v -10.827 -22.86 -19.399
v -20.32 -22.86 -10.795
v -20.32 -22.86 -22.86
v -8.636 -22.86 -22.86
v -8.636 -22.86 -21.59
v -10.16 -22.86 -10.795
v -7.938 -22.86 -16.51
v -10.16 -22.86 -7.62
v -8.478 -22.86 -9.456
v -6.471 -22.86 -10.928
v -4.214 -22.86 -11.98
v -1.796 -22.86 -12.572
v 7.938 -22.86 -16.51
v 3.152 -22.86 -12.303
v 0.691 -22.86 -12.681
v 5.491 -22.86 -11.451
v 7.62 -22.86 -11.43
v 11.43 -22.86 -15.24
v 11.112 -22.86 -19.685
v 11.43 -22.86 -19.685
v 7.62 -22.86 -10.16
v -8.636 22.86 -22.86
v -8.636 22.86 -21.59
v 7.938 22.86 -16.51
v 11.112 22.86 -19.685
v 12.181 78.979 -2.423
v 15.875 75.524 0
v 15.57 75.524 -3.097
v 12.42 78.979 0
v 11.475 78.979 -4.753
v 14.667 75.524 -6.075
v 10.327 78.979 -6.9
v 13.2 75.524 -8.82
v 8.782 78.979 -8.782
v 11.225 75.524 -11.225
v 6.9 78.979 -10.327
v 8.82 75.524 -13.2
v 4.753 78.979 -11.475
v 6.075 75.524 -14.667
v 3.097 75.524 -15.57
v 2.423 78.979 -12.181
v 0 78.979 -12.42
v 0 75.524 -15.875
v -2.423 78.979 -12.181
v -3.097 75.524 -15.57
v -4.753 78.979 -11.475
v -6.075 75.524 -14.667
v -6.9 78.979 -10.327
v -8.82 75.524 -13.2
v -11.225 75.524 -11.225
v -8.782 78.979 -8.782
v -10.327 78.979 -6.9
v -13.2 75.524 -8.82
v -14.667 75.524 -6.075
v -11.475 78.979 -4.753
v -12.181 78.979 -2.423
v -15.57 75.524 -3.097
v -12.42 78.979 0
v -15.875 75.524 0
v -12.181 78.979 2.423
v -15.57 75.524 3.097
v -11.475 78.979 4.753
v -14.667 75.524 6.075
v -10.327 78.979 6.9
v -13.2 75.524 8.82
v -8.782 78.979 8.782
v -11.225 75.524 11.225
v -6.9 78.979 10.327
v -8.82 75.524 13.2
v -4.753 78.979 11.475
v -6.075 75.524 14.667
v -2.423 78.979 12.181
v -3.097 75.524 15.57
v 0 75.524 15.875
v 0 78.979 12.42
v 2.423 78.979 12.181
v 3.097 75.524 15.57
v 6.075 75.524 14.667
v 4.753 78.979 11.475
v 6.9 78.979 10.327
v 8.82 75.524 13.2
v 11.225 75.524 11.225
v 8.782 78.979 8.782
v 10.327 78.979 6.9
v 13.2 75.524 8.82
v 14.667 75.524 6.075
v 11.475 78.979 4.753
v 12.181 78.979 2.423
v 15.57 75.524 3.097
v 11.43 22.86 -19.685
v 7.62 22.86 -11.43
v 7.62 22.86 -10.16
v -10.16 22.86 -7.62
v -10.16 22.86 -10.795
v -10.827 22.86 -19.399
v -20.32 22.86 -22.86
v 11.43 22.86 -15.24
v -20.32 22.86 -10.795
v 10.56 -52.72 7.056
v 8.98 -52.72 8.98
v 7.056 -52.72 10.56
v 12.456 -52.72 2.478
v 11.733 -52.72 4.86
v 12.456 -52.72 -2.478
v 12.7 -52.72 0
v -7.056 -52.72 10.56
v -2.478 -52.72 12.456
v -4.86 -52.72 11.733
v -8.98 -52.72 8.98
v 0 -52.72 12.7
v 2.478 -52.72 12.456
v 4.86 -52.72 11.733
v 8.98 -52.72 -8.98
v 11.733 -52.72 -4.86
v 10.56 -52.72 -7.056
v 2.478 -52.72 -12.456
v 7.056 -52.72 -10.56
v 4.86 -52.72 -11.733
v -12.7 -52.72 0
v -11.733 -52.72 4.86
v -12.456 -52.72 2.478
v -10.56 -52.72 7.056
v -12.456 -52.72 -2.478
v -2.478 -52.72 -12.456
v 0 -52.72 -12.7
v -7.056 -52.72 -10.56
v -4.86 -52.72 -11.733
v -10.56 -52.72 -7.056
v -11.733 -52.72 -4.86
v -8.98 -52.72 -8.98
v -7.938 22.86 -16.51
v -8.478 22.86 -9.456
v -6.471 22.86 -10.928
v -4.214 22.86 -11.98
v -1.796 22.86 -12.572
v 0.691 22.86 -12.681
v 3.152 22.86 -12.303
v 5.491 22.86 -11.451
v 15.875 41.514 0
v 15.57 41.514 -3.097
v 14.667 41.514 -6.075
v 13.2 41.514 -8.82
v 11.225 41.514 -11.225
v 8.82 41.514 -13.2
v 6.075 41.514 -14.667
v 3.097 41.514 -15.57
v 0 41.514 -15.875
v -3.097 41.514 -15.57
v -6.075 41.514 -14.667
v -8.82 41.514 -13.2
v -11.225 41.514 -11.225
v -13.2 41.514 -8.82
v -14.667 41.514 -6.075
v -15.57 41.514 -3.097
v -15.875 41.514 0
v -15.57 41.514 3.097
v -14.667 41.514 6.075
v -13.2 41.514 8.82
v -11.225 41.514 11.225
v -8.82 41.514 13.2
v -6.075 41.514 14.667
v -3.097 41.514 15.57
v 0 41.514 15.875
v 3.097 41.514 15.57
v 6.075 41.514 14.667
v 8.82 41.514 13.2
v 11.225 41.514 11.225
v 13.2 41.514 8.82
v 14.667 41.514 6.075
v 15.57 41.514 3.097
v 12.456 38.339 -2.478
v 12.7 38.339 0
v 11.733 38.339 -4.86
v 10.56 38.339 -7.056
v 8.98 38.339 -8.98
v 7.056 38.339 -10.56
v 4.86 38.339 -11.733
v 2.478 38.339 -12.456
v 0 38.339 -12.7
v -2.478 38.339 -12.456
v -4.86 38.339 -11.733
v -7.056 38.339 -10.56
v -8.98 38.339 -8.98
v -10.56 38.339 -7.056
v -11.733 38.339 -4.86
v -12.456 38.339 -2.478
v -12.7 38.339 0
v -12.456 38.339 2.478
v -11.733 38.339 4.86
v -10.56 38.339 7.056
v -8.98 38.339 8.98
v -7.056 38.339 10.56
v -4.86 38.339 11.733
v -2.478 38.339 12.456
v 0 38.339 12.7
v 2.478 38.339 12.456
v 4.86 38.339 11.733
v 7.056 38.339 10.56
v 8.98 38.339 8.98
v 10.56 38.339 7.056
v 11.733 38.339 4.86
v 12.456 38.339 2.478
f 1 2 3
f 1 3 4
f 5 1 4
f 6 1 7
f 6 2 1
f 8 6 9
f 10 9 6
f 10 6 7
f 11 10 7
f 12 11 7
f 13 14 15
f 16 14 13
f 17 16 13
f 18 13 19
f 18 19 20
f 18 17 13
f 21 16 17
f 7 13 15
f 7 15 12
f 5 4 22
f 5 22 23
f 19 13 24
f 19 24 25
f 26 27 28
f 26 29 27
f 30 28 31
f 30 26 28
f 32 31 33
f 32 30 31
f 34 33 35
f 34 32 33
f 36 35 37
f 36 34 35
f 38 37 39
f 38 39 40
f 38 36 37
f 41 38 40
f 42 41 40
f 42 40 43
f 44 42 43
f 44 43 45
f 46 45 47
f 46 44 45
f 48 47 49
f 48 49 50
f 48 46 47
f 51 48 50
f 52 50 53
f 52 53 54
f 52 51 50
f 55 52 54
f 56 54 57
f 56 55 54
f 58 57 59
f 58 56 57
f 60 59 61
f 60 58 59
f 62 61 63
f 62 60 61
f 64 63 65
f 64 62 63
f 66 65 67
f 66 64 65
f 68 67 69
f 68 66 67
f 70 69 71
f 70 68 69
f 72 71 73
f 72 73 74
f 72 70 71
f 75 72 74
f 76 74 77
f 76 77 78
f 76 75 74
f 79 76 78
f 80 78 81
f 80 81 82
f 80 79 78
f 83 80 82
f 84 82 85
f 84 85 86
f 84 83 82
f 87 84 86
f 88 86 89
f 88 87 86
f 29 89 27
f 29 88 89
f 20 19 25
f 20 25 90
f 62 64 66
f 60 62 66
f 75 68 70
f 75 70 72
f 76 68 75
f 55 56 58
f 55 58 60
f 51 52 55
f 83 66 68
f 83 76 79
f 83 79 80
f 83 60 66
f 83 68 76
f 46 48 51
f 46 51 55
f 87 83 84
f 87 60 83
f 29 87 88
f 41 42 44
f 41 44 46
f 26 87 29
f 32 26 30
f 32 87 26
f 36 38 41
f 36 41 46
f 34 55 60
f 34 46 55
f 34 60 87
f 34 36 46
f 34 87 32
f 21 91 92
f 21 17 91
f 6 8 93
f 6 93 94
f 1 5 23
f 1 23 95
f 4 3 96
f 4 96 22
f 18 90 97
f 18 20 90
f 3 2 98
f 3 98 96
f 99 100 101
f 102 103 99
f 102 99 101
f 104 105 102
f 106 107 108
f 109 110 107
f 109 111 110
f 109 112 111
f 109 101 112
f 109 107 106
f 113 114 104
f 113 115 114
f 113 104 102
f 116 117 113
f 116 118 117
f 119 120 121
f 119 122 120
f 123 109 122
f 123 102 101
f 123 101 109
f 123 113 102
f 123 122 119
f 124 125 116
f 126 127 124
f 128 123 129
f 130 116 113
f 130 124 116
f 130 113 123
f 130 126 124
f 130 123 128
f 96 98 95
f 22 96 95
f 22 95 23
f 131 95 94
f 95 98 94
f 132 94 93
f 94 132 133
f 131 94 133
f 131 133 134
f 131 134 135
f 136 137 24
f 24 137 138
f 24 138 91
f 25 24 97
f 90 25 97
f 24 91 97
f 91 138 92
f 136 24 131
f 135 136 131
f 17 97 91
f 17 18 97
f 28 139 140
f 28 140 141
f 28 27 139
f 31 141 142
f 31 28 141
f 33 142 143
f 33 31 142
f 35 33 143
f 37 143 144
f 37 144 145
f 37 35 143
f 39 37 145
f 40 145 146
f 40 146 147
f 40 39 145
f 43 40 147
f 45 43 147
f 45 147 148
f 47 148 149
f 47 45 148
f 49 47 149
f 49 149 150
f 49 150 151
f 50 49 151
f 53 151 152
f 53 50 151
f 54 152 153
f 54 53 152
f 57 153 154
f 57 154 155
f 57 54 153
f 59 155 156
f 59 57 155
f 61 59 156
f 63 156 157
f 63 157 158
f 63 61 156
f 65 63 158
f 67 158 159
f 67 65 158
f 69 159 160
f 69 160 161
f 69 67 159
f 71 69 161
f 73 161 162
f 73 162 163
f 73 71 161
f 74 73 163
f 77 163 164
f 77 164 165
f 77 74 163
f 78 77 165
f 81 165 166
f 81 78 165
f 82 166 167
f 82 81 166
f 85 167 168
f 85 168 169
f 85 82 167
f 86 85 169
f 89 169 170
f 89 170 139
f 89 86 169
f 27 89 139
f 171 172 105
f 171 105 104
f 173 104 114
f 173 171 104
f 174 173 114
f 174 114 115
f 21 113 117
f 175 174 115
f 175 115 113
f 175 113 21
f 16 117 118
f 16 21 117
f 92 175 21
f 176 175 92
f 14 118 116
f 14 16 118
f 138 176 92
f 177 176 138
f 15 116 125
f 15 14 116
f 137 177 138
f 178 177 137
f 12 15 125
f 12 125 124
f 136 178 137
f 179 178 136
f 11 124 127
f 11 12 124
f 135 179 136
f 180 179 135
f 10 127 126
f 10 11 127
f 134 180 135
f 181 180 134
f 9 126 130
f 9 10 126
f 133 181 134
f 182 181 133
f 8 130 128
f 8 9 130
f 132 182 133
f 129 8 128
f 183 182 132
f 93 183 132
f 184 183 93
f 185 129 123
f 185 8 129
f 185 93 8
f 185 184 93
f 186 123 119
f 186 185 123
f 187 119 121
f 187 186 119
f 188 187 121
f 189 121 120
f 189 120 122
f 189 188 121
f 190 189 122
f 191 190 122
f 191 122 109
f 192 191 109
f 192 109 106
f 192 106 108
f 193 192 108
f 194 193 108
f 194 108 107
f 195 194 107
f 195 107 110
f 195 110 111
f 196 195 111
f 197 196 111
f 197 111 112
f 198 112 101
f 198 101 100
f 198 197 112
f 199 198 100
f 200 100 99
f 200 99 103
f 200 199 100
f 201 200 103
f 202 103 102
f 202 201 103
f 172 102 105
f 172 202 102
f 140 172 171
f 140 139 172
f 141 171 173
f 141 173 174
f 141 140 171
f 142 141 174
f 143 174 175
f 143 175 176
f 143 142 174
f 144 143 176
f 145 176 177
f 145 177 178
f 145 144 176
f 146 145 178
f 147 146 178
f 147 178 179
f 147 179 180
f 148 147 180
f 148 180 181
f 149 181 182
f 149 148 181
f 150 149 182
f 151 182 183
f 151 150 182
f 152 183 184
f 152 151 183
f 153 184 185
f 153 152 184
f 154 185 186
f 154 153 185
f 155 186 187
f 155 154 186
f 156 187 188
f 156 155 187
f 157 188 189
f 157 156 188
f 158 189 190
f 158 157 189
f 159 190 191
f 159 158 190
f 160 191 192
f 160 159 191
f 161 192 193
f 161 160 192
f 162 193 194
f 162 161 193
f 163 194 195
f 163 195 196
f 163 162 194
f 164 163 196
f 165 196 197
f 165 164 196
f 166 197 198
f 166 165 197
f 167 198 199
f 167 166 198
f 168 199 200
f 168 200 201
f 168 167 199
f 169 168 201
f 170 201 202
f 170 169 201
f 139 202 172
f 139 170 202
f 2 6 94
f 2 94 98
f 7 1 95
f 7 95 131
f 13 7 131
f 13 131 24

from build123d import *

# Parameters (mm, degrees)
F3_DEPTH = 22.86


with BuildPart() as f1:
    # F0 (on Top) → F1 (revolve)
    with BuildSketch(Plane.XY):
        Polygon((12.4199267048, 78.9793966675), (0, 78.9793966675), (0, -52.7196033325), (12.7, -52.7196033325), (12.7, 38.3393966675), (15.875, 41.5143966675), (15.875, 75.5243233723), align=None)
    revolve(axis=Axis((0, 13.1298966675, 0), (0, 1, 0)))

    # F2 (on Front) → F3 (join, symmetric)
    with BuildSketch(Plane.XZ):
        with BuildLine():
            Line((7.62, -11.43), (7.62, -10.16))
            ThreePointArc((7.62, -10.16), (-1.7960512242, -12.5723585695), (-10.16, -7.62))
            Line((-10.16, -7.62), (-10.16, -10.795))
            Line((-10.16, -10.795), (-20.32, -10.795))
            Line((-20.32, -10.795), (-20.32, -22.86))
            Line((-20.32, -22.86), (-8.636, -22.86))
            Line((-8.636, -22.86), (-8.636, -21.59))
            Line((-8.636, -21.59), (-10.82675, -19.39925))
            Line((-10.82675, -19.39925), (-7.9375, -16.51))
            Line((-7.9375, -16.51), (7.9375, -16.51))
            Line((7.9375, -16.51), (11.1125, -19.685))
            Line((11.1125, -19.685), (11.43, -19.685))
            Line((11.43, -19.685), (11.43, -15.24))
            Line((11.43, -15.24), (7.62, -11.43))
        make_face()
    extrude(amount=F3_DEPTH, both=True)


solid = f1.part
